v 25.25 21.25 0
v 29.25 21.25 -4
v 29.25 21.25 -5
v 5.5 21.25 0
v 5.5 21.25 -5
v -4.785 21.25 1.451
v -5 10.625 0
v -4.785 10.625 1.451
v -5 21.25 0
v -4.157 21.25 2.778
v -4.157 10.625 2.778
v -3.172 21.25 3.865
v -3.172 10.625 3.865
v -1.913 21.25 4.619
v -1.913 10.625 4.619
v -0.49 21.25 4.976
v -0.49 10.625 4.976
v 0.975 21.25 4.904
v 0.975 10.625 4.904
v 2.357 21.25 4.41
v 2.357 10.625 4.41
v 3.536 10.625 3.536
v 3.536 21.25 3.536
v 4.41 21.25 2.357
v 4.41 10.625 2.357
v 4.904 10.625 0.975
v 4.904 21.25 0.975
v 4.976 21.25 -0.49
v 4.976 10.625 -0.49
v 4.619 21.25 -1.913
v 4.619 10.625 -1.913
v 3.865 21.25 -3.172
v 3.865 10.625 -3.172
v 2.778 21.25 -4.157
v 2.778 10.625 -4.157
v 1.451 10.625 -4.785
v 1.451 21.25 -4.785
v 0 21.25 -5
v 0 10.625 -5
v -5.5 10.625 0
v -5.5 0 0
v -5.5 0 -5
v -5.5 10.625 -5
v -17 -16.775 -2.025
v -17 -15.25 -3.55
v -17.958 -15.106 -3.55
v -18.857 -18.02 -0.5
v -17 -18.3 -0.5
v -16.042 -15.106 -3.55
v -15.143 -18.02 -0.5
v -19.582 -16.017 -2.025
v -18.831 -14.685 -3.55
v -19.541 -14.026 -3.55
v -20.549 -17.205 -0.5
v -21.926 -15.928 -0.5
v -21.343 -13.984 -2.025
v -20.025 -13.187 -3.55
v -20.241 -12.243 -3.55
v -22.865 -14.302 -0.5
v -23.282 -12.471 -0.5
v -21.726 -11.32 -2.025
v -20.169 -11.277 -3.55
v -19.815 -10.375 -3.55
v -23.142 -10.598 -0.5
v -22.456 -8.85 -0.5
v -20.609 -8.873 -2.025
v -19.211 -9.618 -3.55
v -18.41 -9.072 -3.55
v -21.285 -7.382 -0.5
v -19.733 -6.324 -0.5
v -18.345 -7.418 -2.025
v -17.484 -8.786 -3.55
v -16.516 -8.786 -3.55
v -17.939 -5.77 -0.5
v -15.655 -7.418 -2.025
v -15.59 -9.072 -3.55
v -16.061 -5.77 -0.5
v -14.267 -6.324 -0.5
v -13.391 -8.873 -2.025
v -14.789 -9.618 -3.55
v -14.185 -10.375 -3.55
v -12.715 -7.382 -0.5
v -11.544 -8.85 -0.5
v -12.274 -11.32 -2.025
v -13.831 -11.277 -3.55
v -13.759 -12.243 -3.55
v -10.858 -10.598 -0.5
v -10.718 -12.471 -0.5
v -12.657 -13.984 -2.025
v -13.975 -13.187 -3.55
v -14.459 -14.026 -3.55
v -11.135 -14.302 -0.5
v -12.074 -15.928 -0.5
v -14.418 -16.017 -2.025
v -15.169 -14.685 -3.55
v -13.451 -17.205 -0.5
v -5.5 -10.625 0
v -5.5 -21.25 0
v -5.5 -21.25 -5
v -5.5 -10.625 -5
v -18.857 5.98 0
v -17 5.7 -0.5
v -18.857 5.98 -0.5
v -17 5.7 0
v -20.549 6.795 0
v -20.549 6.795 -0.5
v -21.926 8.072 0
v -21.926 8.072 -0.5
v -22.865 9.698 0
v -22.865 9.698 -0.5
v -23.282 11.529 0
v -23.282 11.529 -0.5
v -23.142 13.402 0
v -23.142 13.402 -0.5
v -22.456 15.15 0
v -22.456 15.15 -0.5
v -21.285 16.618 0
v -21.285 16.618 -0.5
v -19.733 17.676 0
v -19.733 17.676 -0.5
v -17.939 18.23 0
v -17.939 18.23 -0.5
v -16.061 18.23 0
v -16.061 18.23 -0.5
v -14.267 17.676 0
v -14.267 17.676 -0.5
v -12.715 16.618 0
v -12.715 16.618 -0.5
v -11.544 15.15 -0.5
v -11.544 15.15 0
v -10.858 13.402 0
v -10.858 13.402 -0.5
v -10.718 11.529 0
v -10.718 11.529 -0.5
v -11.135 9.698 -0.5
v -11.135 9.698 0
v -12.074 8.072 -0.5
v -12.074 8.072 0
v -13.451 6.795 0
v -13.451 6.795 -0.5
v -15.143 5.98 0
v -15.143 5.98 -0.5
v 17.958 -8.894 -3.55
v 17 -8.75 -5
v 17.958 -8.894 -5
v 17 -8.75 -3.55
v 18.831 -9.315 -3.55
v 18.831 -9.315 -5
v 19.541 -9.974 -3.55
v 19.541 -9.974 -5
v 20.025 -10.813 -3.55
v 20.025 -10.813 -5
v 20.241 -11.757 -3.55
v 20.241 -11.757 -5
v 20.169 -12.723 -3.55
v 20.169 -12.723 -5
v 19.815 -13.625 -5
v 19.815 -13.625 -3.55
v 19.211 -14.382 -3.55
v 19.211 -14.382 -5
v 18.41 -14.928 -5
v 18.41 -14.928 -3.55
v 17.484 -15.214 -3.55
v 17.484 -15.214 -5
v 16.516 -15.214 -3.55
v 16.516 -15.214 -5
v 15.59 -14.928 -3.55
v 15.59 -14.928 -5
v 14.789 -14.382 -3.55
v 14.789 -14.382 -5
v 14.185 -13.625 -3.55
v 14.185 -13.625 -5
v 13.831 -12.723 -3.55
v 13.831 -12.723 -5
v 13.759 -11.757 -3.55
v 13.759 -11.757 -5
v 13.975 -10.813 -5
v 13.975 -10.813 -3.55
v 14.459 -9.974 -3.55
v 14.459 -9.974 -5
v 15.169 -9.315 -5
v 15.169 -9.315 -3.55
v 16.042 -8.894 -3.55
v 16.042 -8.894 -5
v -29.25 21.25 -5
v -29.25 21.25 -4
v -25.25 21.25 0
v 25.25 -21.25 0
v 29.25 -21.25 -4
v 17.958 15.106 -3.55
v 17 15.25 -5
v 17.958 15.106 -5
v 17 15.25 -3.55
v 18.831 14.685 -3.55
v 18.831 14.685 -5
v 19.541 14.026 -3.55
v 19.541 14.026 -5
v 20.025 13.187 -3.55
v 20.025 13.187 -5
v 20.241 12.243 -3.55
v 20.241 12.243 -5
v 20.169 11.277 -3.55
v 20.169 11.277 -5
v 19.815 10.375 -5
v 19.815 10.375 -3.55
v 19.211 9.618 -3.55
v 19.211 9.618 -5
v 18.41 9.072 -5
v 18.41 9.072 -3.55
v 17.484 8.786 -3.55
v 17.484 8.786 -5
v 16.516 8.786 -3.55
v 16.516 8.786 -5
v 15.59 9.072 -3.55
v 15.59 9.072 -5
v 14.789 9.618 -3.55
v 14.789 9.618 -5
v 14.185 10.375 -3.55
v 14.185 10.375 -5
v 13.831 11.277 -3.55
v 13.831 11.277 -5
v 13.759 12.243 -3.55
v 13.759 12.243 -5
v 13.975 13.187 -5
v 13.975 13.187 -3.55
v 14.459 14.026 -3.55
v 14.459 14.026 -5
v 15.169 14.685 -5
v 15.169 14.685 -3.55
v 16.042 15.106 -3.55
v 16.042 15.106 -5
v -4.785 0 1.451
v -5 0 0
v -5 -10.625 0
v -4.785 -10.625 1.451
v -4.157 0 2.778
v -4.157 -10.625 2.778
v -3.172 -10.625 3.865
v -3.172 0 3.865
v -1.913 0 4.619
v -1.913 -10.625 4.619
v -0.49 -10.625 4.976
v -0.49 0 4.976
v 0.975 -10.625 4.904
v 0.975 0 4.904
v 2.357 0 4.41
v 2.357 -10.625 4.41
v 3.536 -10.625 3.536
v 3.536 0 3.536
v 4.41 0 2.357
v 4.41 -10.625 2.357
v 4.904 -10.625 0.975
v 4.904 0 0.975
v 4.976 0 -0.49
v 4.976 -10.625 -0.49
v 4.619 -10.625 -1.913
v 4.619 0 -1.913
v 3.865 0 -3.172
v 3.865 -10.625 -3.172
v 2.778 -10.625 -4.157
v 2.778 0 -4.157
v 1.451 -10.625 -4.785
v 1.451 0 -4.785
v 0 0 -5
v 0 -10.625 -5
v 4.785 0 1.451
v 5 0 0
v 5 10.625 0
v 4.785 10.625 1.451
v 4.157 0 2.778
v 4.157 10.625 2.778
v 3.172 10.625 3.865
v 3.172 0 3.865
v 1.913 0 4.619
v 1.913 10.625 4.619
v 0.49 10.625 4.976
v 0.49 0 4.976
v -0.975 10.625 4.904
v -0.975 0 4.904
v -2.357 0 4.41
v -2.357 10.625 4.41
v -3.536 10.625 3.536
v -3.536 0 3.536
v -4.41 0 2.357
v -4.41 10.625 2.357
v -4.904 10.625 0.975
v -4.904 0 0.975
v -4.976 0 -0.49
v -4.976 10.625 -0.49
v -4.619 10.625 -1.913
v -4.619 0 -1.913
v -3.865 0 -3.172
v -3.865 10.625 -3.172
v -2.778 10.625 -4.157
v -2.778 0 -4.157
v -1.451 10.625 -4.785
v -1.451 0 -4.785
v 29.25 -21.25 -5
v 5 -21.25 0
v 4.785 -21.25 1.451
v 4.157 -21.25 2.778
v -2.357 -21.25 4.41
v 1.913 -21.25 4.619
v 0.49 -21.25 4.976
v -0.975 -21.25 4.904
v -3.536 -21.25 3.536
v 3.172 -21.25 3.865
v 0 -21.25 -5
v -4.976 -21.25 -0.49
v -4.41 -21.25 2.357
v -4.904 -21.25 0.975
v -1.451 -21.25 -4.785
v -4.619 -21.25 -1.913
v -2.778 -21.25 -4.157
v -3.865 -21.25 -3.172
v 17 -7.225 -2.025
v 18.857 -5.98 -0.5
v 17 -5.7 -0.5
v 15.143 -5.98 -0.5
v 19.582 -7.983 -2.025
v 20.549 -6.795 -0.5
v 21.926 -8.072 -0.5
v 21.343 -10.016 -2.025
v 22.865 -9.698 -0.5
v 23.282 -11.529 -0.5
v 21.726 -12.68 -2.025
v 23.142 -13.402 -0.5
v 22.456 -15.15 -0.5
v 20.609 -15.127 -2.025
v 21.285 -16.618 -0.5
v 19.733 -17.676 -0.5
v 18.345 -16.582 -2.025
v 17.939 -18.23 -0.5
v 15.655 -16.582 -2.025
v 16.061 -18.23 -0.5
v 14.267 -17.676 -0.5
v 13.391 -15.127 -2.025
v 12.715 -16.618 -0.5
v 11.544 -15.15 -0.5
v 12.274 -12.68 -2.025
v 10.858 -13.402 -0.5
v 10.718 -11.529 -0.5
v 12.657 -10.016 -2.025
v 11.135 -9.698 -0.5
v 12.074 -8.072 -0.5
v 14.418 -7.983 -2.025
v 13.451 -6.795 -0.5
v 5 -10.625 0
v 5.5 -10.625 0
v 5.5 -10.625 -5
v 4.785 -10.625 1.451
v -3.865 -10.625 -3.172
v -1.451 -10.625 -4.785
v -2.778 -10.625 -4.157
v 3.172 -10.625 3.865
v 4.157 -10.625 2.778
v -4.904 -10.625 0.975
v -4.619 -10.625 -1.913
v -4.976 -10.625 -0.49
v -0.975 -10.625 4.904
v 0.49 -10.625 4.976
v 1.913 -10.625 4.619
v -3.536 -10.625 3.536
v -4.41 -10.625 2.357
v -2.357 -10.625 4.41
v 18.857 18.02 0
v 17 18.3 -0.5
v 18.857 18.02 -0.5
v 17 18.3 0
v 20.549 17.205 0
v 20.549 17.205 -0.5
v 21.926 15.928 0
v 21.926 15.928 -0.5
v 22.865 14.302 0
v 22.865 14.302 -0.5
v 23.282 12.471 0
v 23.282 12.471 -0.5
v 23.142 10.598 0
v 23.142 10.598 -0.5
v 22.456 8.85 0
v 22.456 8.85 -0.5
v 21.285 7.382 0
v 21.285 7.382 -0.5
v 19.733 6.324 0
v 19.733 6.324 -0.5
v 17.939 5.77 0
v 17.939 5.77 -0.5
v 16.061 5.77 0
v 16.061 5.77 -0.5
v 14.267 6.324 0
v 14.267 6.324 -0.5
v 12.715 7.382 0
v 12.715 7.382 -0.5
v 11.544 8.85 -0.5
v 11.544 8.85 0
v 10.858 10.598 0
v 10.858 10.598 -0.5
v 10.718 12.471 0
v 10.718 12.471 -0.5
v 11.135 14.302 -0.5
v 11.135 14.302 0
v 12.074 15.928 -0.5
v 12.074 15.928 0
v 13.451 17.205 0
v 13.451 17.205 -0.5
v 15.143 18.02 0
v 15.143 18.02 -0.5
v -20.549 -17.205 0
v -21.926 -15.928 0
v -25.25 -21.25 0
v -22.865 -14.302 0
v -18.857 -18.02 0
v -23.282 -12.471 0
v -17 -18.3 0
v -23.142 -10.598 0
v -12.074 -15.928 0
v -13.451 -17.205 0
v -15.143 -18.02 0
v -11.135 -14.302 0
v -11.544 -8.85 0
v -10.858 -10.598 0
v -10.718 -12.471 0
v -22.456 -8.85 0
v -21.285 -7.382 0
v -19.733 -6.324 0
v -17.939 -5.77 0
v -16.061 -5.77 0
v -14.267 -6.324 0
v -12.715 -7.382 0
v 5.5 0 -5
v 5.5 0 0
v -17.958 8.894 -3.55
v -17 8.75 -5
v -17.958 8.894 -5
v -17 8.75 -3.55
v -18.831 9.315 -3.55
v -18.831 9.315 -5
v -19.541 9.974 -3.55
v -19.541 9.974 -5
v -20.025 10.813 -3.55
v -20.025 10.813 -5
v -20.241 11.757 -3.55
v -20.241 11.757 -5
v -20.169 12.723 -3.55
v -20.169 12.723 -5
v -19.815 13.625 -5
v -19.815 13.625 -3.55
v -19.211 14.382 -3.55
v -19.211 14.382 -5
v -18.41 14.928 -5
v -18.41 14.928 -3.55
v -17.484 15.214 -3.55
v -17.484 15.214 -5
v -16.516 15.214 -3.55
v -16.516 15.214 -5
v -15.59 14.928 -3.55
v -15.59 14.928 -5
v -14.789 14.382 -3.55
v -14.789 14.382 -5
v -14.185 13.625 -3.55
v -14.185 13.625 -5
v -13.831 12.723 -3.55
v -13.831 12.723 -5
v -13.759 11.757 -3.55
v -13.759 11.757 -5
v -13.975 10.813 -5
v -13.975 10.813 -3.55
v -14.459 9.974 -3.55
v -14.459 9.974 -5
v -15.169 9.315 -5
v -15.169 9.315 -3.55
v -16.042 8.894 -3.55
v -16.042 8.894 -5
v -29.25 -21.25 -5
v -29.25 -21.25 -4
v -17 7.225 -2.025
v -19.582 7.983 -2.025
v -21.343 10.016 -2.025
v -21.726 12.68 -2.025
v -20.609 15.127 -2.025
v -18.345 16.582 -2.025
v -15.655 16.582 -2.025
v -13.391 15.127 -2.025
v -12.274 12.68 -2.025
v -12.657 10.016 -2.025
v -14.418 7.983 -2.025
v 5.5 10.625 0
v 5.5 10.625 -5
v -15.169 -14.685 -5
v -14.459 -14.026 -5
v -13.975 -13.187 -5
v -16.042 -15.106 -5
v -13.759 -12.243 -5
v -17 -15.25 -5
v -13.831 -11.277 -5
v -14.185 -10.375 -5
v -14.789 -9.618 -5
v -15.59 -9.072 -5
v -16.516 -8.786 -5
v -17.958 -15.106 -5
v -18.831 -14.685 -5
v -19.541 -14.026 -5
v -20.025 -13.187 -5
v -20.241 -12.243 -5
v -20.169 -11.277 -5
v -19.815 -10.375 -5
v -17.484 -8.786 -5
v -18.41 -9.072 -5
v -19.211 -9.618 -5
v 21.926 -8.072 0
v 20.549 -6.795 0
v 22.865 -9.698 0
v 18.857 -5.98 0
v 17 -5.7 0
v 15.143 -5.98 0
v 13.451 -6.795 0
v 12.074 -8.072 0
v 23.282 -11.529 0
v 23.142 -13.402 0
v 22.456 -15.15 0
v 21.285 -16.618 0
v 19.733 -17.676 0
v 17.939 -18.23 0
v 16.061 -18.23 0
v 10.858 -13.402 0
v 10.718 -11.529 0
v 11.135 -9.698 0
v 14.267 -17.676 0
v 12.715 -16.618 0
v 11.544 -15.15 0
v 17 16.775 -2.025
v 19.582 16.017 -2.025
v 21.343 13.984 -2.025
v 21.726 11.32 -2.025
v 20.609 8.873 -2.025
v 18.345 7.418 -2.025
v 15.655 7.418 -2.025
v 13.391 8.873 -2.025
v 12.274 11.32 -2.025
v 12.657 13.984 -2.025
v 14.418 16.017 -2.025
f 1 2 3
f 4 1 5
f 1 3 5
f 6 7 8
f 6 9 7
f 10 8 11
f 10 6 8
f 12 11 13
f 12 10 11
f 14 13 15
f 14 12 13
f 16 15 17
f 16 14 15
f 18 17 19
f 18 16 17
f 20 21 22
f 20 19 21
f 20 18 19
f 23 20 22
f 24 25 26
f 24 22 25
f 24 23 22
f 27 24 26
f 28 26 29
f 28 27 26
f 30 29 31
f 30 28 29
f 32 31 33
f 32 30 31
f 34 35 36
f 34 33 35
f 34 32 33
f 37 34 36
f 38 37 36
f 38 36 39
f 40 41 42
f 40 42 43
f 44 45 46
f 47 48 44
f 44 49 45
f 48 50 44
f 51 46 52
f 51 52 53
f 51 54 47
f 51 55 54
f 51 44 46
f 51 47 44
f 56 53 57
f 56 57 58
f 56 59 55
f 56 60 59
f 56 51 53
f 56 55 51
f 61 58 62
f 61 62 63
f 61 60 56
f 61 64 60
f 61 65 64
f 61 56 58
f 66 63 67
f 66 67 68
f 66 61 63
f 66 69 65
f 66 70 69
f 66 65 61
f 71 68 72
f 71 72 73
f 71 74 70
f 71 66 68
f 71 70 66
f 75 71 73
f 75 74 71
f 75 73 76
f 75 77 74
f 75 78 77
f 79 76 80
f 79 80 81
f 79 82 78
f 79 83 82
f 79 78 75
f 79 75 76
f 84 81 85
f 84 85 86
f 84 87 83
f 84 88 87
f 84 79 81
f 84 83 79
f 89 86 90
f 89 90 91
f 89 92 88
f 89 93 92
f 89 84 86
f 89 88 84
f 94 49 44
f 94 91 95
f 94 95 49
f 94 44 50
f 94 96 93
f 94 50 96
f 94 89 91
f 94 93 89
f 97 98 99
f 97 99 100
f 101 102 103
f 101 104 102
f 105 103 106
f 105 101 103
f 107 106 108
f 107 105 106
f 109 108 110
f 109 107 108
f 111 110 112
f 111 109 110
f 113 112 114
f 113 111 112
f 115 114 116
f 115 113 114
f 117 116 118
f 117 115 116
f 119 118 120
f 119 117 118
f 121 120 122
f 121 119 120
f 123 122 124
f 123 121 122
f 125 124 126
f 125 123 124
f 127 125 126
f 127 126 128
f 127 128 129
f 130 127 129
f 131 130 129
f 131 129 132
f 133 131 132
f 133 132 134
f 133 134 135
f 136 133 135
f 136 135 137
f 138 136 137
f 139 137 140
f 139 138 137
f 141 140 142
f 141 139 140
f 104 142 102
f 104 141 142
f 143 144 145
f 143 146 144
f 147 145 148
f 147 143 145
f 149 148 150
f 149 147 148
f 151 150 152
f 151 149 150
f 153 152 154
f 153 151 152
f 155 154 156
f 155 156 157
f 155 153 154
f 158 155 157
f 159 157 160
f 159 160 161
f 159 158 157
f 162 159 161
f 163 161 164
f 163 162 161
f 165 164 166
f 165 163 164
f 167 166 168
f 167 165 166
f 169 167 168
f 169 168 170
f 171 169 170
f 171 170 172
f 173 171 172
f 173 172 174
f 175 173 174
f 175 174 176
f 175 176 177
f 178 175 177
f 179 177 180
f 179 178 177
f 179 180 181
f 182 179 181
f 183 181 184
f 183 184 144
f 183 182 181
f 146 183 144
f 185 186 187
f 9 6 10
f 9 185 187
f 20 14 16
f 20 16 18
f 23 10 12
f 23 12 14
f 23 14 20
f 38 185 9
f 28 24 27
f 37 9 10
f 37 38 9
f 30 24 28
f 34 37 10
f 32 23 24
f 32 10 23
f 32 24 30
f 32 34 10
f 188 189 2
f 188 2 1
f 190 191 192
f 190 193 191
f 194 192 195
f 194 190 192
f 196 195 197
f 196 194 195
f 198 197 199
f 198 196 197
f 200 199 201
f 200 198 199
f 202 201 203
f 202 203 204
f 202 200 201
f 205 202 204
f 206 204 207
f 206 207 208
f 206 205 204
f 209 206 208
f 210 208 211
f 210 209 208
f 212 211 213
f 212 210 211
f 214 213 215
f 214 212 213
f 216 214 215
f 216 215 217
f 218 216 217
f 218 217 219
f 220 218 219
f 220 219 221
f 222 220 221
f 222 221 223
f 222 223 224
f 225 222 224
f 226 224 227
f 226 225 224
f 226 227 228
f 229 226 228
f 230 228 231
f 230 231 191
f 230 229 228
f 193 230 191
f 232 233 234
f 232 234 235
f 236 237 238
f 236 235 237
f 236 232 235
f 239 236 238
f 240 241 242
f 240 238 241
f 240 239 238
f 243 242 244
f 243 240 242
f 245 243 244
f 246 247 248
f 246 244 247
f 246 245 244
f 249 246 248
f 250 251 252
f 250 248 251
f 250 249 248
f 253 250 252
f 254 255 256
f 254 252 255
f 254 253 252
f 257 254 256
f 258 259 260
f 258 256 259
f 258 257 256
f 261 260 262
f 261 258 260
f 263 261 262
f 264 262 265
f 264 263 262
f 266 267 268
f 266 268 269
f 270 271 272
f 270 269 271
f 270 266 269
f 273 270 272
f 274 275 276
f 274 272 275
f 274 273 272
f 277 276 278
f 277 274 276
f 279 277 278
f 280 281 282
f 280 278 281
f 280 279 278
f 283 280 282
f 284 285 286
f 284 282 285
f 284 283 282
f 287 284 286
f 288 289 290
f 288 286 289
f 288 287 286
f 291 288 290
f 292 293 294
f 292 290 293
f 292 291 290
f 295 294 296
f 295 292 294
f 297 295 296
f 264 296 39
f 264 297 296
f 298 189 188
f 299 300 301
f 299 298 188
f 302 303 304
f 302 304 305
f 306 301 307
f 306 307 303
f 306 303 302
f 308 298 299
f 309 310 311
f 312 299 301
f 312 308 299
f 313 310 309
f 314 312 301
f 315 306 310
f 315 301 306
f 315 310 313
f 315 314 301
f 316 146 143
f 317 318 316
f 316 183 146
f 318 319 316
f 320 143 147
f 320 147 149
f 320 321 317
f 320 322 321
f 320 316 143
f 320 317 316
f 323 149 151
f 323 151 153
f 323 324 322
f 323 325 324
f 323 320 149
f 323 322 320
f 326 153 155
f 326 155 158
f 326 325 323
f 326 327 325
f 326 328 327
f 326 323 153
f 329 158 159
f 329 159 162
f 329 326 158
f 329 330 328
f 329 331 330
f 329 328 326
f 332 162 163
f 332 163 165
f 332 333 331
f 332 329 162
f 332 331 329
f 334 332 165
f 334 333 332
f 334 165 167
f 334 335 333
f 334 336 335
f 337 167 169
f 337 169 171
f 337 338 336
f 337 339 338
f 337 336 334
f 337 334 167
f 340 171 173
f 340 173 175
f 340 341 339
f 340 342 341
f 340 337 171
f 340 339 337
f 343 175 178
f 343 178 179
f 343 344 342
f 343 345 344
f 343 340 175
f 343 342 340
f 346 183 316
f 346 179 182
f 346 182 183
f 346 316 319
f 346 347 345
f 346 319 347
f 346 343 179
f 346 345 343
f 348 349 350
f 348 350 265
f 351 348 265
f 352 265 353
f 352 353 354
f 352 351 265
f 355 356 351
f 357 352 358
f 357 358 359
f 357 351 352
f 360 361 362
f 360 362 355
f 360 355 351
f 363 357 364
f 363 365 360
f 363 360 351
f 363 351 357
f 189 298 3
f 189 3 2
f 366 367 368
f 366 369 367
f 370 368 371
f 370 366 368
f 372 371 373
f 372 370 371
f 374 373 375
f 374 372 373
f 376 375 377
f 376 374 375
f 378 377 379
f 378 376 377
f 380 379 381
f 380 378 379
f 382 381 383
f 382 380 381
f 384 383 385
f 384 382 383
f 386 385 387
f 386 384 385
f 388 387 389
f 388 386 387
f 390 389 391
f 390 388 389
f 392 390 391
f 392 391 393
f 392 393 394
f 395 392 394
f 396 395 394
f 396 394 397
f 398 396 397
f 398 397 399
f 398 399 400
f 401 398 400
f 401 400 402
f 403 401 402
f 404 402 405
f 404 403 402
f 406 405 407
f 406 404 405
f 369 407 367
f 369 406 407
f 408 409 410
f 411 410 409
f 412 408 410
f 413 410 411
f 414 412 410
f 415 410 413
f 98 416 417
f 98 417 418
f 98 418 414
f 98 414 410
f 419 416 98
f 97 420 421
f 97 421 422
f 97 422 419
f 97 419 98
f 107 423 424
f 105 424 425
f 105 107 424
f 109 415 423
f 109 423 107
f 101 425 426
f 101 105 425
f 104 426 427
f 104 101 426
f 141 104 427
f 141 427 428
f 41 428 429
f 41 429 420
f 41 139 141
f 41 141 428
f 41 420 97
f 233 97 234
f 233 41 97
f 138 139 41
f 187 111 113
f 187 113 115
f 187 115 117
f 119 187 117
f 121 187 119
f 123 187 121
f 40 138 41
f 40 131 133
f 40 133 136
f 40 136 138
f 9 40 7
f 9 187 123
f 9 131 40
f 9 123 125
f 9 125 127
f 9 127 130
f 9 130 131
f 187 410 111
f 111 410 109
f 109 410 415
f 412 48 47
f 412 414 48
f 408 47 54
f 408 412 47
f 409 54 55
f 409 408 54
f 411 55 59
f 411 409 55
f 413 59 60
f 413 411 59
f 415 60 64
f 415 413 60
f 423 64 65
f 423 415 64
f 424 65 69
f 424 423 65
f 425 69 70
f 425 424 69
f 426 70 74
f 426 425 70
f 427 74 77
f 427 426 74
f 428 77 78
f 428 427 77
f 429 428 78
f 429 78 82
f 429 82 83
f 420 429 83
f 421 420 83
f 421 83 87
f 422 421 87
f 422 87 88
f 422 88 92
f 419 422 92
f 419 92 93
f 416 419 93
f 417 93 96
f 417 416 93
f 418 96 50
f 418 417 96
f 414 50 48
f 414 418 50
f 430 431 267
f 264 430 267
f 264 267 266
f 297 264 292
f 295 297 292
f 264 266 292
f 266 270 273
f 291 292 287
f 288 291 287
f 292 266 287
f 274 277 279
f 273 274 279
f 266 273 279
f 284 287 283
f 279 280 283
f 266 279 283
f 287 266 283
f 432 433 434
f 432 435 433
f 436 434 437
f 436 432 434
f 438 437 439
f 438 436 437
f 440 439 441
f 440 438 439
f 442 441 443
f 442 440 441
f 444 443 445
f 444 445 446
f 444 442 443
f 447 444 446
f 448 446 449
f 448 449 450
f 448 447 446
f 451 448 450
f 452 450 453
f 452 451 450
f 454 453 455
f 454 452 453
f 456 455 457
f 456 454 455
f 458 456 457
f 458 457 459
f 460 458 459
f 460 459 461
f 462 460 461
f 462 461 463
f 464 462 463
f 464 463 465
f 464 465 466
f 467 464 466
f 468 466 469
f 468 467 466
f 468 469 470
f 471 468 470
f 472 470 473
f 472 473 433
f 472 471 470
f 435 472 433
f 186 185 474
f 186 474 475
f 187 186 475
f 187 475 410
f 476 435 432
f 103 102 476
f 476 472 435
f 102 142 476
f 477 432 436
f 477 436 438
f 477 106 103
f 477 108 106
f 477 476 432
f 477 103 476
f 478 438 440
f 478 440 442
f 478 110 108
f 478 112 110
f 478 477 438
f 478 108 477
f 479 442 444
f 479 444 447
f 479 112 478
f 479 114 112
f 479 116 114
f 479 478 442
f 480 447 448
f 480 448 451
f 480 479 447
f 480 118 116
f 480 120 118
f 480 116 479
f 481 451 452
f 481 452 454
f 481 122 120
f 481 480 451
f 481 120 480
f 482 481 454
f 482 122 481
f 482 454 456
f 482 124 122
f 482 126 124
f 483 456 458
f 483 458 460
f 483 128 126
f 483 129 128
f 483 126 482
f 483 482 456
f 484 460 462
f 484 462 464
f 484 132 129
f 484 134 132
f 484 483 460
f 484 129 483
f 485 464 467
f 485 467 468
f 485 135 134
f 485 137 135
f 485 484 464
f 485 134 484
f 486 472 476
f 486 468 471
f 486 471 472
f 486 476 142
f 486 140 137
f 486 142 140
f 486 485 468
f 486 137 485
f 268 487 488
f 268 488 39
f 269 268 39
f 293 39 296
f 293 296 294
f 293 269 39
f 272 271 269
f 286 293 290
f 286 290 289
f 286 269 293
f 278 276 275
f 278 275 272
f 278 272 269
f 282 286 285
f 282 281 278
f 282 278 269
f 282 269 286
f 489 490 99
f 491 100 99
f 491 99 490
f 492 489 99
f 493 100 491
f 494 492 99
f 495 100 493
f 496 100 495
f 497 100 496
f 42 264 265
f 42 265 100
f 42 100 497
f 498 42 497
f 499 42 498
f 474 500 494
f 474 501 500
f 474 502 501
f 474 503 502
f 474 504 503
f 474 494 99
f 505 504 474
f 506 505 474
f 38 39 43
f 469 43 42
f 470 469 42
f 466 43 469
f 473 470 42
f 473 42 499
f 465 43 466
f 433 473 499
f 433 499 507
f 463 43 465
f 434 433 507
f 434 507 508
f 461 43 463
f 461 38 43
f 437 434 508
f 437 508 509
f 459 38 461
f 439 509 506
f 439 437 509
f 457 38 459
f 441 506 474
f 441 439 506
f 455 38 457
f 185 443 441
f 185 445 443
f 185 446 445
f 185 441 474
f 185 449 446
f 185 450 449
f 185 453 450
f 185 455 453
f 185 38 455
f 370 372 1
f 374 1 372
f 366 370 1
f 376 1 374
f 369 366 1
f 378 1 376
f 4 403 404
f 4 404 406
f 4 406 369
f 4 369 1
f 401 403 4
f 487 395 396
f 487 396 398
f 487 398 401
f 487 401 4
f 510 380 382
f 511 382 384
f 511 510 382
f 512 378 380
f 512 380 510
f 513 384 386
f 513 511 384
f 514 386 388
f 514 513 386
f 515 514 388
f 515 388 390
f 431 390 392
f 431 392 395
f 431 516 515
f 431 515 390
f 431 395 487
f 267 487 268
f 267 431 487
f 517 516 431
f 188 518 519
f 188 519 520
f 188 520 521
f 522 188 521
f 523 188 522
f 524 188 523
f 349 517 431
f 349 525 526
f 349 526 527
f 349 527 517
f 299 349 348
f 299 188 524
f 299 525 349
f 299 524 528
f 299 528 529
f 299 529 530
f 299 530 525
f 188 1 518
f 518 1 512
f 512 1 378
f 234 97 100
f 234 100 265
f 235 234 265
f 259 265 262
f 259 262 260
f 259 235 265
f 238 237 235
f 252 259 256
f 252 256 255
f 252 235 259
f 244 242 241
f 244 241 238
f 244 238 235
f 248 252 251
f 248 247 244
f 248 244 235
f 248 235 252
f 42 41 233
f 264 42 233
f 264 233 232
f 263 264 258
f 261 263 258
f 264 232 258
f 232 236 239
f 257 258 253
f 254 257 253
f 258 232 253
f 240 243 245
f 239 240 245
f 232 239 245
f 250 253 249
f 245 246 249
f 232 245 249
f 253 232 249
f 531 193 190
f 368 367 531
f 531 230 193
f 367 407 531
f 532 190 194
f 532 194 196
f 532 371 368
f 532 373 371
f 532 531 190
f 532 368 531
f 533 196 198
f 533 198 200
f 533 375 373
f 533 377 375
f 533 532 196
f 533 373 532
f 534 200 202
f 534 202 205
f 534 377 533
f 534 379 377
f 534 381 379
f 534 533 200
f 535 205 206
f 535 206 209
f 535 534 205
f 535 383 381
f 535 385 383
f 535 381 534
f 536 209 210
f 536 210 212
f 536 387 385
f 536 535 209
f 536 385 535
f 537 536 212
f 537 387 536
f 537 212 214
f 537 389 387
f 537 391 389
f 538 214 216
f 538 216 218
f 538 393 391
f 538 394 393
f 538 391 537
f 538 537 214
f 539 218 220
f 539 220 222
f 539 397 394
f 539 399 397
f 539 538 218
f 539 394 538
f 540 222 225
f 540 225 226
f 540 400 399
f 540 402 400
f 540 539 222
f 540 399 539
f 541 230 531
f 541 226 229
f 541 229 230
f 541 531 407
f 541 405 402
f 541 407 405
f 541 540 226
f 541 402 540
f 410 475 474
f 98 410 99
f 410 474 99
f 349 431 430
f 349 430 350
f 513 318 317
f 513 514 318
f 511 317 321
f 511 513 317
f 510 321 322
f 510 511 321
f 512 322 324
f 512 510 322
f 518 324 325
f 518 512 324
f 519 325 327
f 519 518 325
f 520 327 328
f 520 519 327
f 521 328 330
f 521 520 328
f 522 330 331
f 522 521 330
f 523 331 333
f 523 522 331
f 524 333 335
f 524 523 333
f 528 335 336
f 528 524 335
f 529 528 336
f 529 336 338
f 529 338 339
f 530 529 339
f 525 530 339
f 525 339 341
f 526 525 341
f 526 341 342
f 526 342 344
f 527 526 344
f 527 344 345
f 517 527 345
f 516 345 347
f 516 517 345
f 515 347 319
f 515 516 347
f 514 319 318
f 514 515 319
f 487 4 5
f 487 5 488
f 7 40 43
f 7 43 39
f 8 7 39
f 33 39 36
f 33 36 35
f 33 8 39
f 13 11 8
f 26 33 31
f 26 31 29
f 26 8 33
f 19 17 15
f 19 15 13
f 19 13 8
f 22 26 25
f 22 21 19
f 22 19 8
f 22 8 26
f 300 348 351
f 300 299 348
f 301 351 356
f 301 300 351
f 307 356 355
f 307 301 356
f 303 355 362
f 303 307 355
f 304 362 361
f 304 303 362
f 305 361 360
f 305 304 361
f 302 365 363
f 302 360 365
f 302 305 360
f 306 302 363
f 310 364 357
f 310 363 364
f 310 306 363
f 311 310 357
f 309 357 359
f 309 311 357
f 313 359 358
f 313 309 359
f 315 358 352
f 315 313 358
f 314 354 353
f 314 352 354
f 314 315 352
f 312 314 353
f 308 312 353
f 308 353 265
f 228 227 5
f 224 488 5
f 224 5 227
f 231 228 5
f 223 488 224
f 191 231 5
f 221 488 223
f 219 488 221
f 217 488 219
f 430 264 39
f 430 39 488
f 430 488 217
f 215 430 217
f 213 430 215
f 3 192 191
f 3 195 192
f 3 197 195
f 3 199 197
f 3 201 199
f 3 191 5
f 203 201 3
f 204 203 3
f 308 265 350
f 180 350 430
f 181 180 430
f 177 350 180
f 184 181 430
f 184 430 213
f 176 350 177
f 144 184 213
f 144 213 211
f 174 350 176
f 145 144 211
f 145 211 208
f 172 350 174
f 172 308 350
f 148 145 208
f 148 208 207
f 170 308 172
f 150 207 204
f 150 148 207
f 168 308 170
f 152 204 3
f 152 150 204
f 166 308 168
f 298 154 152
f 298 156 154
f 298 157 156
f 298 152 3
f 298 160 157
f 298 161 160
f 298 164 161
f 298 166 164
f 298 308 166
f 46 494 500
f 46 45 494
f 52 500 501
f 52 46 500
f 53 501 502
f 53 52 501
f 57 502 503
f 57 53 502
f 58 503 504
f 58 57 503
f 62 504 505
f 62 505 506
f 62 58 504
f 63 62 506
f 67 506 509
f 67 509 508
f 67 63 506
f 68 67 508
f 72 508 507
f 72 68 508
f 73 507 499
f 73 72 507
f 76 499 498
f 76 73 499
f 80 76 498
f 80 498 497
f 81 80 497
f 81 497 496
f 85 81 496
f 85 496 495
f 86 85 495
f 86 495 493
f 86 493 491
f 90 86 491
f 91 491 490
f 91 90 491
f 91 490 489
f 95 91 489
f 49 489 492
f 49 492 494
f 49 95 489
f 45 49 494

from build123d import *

# Parameters (mm, degrees)
EXTRUDE_1_DEPTH            = 21.25
SKETCH_3_W                 = 10.5
SKETCH_3_H                 = 10.625
CUT_EXTRUDE_1_DEPTH        = 6
CUT_EXTRUDE_1_DEPTH_BACK   = 6
HOLE_WIZARD_M61_AT_2_COUNT = 2
HOLE_WIZARD_M61_AT_2_PITCH = 24
PATTERN_CIRCULAR_1_COUNT   = 2


with BuildPart() as part:
    # Эскиз1 → Бобышка-Вытянуть1 (new body, symmetric)
    with BuildSketch(Plane(origin=(0, 0, 0), x_dir=(1, 0, 0), z_dir=(0, 1, 0))):
        with BuildLine():
            Line((0, 5), (-29.25, 5))
            Line((-29.25, 5), (-29.25, 4))
            Line((-29.25, 4), (-25.25, 0))
            Line((-25.25, 0), (-5, 0))
            ThreePointArc((-5, 0), (3.535533906, -3.535533906), (0, 5))
        make_face()
    extrude(amount=EXTRUDE_1_DEPTH, both=True)

    # Эскиз3 → Вырез-Вытянуть1 (cut, two sides)
    with BuildSketch(Plane.XY) as cut_extrude_1_sk:
        with Locations((-0.25, 5.3125)):
            Rectangle(SKETCH_3_W, SKETCH_3_H)
        with Locations((-0.25, -15.9375)):
            Rectangle(SKETCH_3_W, SKETCH_3_H)
    extrude(amount=CUT_EXTRUDE_1_DEPTH, mode=Mode.SUBTRACT)
    extrude(cut_extrude_1_sk.sketch, amount=-CUT_EXTRUDE_1_DEPTH_BACK, mode=Mode.SUBTRACT)

    # Эскиз6 → Зенковка для винта с полупотайной головкой M61 (revolve, cut)
    with BuildSketch(Plane(origin=(-17, 12, 0), x_dir=(0, -1, 0), z_dir=(1, 0, 0))):
        Polygon((0, 0), (0, 5), (3.25, 5), (3.25, 3.55), (6.3, 0.5), (6.3, 0), align=None)
    hole_wizard_m61 = revolve(axis=Axis((-17, 12, 6.35), (0, 0, -1)), mode=Mode.SUBTRACT)

    # Зенковка для винта с полупотайной головкой M61 at 2: Зенковка для винта с полупотайной головкой M61 ×2
    with Locations(*[(0, -i * HOLE_WIZARD_M61_AT_2_PITCH, 0) for i in range(1, HOLE_WIZARD_M61_AT_2_COUNT)]):
        add(hole_wizard_m61, mode=Mode.SUBTRACT)


with BuildPart() as pattern_circular_1_1:
    # Круговой массив1: pattern copy
    add(part.part.rotate(Axis((0, 0, 0), (0, 0, 1)), 1 * 360 / PATTERN_CIRCULAR_1_COUNT))


solid = Compound([part.part, pattern_circular_1_1.part])
